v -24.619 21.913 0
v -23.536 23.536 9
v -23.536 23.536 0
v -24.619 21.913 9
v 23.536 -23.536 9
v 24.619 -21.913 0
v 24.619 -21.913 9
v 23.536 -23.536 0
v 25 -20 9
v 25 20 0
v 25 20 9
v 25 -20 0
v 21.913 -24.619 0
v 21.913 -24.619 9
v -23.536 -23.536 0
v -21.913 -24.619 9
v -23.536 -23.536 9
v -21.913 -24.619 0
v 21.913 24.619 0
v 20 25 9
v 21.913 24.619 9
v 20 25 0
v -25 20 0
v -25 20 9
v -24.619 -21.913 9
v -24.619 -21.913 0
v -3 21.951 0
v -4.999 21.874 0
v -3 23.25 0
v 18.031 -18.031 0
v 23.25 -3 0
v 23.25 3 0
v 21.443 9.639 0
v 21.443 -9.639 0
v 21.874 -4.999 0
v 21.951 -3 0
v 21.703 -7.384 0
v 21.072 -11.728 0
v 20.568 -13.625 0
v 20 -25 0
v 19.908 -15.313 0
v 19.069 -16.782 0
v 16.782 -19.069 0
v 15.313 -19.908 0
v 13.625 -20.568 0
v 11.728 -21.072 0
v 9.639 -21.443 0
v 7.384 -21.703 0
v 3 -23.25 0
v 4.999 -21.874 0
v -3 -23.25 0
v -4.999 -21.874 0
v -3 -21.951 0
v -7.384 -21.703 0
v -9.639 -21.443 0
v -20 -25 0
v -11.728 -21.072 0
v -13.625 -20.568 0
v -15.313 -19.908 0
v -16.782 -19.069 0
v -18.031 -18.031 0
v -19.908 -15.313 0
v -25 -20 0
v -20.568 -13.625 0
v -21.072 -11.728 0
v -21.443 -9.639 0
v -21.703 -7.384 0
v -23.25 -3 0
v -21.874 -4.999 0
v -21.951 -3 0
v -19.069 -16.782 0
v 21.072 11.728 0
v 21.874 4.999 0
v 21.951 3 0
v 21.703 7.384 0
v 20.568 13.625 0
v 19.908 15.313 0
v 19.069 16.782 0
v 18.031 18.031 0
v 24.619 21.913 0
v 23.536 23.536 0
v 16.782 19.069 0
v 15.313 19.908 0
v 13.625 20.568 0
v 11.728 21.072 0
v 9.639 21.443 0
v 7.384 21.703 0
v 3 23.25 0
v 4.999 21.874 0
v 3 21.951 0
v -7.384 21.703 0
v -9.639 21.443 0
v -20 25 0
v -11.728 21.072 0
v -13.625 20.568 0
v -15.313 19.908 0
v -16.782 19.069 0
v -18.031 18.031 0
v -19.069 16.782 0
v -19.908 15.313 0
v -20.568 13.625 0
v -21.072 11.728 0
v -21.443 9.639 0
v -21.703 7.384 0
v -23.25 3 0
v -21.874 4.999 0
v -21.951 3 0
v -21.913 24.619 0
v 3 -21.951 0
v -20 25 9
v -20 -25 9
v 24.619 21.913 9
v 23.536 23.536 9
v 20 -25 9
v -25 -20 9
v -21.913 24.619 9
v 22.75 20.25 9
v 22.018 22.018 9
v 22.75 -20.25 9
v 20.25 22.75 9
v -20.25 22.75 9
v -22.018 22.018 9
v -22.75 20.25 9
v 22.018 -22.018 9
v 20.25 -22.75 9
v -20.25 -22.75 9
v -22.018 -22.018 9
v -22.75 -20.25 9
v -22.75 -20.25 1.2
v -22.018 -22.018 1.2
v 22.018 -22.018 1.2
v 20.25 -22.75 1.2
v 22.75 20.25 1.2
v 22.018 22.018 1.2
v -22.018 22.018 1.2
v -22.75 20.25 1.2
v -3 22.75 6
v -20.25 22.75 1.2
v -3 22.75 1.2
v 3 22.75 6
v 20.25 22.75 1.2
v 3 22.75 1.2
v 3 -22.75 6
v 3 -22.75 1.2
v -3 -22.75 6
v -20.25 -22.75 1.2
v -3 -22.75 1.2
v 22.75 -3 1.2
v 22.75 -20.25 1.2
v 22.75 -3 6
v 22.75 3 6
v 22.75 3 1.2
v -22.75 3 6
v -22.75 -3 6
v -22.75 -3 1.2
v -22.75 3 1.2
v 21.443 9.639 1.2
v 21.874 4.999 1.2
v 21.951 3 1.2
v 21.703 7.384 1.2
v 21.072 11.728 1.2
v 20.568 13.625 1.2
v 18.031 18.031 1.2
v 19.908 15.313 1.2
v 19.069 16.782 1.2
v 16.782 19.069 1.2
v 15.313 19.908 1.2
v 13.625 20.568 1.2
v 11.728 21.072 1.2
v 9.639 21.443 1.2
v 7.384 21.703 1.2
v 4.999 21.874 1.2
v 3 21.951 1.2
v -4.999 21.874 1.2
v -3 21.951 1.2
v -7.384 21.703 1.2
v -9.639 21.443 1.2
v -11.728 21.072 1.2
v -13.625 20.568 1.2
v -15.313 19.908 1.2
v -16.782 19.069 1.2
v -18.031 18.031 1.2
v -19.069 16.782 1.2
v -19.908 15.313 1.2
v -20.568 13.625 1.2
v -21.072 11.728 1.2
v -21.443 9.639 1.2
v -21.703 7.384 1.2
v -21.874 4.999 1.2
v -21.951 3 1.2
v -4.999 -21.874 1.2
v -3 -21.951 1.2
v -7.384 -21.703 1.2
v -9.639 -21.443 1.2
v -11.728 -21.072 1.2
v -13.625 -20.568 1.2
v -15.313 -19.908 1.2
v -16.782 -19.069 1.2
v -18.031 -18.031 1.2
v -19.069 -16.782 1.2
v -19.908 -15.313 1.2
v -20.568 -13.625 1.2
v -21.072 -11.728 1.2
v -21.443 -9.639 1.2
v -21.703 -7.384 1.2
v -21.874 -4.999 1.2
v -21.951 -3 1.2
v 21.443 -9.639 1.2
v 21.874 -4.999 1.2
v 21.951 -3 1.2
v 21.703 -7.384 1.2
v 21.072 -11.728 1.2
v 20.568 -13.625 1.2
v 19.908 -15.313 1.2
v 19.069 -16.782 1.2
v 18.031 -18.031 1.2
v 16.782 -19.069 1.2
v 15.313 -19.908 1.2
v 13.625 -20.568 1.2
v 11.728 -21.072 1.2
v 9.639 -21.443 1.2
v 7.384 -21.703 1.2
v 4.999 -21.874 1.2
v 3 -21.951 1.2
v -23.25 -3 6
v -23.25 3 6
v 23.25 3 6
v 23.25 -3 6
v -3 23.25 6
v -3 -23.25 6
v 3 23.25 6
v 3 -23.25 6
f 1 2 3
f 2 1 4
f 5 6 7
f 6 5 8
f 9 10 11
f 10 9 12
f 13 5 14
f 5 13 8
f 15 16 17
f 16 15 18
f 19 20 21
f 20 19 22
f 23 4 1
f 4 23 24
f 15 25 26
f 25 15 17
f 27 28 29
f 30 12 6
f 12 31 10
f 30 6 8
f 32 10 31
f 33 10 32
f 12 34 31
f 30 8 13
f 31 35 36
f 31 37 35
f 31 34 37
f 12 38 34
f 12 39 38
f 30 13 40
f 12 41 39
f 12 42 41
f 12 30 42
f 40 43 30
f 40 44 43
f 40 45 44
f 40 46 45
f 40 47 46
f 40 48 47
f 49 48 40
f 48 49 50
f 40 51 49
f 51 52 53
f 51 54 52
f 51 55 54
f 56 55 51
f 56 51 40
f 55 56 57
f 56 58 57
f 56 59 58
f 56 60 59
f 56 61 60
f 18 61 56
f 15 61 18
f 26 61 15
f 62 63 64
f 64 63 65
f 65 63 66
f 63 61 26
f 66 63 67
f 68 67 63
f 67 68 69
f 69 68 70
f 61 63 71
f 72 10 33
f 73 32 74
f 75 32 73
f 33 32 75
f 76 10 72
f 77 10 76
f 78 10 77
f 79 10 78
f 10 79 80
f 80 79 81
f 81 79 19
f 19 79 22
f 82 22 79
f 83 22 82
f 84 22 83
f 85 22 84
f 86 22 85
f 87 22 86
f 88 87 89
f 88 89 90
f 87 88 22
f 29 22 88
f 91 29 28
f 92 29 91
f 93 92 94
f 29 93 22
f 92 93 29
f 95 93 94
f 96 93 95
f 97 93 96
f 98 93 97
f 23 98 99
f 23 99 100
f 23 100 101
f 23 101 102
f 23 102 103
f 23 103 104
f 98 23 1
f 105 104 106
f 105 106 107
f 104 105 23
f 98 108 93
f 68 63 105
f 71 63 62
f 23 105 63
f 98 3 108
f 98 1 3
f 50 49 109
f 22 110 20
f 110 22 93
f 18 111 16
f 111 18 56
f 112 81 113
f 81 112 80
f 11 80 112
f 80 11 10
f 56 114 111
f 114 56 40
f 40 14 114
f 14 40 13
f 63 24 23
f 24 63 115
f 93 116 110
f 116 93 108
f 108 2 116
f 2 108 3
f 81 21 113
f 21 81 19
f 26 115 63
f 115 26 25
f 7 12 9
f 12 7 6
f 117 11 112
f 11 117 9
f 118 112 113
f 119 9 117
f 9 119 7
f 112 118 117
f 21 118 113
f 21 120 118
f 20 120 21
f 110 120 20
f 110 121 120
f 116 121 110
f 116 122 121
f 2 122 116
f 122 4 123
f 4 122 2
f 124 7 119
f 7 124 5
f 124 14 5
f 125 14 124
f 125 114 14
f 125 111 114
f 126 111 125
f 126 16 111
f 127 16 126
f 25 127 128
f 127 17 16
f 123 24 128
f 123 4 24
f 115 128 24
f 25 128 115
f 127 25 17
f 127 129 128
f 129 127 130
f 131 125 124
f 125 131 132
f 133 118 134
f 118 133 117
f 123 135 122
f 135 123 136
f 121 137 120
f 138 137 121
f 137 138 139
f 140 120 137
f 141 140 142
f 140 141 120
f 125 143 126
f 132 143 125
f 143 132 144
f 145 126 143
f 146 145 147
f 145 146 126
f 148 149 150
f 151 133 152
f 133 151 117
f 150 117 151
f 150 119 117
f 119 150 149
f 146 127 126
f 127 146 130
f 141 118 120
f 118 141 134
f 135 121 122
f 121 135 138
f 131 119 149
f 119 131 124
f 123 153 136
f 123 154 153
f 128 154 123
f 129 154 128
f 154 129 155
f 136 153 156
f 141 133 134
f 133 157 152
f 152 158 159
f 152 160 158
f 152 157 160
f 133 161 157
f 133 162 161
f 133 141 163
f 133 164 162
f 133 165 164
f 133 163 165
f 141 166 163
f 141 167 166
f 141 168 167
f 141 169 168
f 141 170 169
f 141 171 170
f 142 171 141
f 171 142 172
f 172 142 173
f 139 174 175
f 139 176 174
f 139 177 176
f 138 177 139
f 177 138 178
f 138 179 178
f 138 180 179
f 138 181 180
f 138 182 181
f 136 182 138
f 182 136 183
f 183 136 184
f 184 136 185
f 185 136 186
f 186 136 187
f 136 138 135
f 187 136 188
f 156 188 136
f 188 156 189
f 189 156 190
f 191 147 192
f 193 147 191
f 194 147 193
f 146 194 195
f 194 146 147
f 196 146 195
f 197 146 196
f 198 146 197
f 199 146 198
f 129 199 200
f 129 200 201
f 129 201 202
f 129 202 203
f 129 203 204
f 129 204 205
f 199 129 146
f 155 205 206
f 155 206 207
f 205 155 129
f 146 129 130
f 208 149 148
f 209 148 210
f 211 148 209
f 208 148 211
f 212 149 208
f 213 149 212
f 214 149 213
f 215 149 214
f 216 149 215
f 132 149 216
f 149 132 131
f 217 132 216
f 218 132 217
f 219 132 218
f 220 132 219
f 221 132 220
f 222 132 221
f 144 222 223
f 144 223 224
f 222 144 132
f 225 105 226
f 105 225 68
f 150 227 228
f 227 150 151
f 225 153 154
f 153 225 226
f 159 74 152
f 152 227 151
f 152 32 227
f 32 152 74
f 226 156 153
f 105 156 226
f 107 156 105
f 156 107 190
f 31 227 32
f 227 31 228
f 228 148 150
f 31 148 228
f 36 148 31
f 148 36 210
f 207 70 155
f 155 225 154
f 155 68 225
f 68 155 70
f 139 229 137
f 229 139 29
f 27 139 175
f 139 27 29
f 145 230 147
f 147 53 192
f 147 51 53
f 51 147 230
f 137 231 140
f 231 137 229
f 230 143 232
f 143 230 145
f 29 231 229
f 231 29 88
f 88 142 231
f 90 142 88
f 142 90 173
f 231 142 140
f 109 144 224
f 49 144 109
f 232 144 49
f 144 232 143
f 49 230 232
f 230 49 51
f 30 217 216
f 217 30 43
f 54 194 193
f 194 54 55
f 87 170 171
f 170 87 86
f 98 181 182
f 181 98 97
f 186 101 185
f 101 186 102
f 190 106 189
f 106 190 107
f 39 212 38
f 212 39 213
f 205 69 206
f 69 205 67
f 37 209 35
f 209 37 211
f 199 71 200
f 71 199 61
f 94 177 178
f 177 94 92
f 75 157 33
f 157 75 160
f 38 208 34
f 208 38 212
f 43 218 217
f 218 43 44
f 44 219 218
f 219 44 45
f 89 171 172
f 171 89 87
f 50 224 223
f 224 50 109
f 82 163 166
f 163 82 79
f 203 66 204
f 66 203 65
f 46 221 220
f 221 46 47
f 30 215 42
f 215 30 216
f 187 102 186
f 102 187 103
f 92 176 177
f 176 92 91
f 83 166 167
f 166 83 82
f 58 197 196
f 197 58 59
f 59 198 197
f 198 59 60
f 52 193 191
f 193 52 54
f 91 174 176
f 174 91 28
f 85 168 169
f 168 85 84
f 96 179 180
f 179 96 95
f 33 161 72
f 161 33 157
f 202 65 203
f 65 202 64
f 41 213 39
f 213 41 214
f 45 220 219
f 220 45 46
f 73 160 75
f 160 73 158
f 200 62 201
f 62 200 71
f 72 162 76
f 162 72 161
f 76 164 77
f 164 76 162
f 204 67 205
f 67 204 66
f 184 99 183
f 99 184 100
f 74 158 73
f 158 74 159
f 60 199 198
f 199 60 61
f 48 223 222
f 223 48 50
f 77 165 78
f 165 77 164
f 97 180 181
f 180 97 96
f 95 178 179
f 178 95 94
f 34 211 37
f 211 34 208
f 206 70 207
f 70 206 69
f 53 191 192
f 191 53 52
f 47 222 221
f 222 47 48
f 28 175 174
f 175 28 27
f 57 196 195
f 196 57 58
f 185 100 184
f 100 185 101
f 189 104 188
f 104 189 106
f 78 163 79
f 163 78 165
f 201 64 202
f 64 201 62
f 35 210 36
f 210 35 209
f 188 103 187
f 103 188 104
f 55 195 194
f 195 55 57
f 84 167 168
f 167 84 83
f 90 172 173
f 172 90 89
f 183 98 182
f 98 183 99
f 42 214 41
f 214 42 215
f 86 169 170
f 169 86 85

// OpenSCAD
baseline5050();


module smooth(r=3) offset(r=r) offset(r=-r) children();



module baseline5050() difference() {
    linear_extrude(9) smooth(5) square([50,50], true);
    translate([0,0,1.2]) linear_extrude(9) smooth(2.5) square([45.5,45.5], true);
    linear_extrude(6) square([46.5,6], true);
    linear_extrude(6) square([6,46.5], true);
    
    large_radius=51/2;
    small_radius=44/2;
    radius_delta=large_radius-small_radius;
    linear_extrude(9)  difference() {
        polygon([
            for(a=[0:5:360]) [
                (large_radius+(sin((a-45)*2)*radius_delta))*cos(a), 
                (large_radius+(cos(a*2)*radius_delta))*sin(a)
            ]
        ]);
    }
    
}
